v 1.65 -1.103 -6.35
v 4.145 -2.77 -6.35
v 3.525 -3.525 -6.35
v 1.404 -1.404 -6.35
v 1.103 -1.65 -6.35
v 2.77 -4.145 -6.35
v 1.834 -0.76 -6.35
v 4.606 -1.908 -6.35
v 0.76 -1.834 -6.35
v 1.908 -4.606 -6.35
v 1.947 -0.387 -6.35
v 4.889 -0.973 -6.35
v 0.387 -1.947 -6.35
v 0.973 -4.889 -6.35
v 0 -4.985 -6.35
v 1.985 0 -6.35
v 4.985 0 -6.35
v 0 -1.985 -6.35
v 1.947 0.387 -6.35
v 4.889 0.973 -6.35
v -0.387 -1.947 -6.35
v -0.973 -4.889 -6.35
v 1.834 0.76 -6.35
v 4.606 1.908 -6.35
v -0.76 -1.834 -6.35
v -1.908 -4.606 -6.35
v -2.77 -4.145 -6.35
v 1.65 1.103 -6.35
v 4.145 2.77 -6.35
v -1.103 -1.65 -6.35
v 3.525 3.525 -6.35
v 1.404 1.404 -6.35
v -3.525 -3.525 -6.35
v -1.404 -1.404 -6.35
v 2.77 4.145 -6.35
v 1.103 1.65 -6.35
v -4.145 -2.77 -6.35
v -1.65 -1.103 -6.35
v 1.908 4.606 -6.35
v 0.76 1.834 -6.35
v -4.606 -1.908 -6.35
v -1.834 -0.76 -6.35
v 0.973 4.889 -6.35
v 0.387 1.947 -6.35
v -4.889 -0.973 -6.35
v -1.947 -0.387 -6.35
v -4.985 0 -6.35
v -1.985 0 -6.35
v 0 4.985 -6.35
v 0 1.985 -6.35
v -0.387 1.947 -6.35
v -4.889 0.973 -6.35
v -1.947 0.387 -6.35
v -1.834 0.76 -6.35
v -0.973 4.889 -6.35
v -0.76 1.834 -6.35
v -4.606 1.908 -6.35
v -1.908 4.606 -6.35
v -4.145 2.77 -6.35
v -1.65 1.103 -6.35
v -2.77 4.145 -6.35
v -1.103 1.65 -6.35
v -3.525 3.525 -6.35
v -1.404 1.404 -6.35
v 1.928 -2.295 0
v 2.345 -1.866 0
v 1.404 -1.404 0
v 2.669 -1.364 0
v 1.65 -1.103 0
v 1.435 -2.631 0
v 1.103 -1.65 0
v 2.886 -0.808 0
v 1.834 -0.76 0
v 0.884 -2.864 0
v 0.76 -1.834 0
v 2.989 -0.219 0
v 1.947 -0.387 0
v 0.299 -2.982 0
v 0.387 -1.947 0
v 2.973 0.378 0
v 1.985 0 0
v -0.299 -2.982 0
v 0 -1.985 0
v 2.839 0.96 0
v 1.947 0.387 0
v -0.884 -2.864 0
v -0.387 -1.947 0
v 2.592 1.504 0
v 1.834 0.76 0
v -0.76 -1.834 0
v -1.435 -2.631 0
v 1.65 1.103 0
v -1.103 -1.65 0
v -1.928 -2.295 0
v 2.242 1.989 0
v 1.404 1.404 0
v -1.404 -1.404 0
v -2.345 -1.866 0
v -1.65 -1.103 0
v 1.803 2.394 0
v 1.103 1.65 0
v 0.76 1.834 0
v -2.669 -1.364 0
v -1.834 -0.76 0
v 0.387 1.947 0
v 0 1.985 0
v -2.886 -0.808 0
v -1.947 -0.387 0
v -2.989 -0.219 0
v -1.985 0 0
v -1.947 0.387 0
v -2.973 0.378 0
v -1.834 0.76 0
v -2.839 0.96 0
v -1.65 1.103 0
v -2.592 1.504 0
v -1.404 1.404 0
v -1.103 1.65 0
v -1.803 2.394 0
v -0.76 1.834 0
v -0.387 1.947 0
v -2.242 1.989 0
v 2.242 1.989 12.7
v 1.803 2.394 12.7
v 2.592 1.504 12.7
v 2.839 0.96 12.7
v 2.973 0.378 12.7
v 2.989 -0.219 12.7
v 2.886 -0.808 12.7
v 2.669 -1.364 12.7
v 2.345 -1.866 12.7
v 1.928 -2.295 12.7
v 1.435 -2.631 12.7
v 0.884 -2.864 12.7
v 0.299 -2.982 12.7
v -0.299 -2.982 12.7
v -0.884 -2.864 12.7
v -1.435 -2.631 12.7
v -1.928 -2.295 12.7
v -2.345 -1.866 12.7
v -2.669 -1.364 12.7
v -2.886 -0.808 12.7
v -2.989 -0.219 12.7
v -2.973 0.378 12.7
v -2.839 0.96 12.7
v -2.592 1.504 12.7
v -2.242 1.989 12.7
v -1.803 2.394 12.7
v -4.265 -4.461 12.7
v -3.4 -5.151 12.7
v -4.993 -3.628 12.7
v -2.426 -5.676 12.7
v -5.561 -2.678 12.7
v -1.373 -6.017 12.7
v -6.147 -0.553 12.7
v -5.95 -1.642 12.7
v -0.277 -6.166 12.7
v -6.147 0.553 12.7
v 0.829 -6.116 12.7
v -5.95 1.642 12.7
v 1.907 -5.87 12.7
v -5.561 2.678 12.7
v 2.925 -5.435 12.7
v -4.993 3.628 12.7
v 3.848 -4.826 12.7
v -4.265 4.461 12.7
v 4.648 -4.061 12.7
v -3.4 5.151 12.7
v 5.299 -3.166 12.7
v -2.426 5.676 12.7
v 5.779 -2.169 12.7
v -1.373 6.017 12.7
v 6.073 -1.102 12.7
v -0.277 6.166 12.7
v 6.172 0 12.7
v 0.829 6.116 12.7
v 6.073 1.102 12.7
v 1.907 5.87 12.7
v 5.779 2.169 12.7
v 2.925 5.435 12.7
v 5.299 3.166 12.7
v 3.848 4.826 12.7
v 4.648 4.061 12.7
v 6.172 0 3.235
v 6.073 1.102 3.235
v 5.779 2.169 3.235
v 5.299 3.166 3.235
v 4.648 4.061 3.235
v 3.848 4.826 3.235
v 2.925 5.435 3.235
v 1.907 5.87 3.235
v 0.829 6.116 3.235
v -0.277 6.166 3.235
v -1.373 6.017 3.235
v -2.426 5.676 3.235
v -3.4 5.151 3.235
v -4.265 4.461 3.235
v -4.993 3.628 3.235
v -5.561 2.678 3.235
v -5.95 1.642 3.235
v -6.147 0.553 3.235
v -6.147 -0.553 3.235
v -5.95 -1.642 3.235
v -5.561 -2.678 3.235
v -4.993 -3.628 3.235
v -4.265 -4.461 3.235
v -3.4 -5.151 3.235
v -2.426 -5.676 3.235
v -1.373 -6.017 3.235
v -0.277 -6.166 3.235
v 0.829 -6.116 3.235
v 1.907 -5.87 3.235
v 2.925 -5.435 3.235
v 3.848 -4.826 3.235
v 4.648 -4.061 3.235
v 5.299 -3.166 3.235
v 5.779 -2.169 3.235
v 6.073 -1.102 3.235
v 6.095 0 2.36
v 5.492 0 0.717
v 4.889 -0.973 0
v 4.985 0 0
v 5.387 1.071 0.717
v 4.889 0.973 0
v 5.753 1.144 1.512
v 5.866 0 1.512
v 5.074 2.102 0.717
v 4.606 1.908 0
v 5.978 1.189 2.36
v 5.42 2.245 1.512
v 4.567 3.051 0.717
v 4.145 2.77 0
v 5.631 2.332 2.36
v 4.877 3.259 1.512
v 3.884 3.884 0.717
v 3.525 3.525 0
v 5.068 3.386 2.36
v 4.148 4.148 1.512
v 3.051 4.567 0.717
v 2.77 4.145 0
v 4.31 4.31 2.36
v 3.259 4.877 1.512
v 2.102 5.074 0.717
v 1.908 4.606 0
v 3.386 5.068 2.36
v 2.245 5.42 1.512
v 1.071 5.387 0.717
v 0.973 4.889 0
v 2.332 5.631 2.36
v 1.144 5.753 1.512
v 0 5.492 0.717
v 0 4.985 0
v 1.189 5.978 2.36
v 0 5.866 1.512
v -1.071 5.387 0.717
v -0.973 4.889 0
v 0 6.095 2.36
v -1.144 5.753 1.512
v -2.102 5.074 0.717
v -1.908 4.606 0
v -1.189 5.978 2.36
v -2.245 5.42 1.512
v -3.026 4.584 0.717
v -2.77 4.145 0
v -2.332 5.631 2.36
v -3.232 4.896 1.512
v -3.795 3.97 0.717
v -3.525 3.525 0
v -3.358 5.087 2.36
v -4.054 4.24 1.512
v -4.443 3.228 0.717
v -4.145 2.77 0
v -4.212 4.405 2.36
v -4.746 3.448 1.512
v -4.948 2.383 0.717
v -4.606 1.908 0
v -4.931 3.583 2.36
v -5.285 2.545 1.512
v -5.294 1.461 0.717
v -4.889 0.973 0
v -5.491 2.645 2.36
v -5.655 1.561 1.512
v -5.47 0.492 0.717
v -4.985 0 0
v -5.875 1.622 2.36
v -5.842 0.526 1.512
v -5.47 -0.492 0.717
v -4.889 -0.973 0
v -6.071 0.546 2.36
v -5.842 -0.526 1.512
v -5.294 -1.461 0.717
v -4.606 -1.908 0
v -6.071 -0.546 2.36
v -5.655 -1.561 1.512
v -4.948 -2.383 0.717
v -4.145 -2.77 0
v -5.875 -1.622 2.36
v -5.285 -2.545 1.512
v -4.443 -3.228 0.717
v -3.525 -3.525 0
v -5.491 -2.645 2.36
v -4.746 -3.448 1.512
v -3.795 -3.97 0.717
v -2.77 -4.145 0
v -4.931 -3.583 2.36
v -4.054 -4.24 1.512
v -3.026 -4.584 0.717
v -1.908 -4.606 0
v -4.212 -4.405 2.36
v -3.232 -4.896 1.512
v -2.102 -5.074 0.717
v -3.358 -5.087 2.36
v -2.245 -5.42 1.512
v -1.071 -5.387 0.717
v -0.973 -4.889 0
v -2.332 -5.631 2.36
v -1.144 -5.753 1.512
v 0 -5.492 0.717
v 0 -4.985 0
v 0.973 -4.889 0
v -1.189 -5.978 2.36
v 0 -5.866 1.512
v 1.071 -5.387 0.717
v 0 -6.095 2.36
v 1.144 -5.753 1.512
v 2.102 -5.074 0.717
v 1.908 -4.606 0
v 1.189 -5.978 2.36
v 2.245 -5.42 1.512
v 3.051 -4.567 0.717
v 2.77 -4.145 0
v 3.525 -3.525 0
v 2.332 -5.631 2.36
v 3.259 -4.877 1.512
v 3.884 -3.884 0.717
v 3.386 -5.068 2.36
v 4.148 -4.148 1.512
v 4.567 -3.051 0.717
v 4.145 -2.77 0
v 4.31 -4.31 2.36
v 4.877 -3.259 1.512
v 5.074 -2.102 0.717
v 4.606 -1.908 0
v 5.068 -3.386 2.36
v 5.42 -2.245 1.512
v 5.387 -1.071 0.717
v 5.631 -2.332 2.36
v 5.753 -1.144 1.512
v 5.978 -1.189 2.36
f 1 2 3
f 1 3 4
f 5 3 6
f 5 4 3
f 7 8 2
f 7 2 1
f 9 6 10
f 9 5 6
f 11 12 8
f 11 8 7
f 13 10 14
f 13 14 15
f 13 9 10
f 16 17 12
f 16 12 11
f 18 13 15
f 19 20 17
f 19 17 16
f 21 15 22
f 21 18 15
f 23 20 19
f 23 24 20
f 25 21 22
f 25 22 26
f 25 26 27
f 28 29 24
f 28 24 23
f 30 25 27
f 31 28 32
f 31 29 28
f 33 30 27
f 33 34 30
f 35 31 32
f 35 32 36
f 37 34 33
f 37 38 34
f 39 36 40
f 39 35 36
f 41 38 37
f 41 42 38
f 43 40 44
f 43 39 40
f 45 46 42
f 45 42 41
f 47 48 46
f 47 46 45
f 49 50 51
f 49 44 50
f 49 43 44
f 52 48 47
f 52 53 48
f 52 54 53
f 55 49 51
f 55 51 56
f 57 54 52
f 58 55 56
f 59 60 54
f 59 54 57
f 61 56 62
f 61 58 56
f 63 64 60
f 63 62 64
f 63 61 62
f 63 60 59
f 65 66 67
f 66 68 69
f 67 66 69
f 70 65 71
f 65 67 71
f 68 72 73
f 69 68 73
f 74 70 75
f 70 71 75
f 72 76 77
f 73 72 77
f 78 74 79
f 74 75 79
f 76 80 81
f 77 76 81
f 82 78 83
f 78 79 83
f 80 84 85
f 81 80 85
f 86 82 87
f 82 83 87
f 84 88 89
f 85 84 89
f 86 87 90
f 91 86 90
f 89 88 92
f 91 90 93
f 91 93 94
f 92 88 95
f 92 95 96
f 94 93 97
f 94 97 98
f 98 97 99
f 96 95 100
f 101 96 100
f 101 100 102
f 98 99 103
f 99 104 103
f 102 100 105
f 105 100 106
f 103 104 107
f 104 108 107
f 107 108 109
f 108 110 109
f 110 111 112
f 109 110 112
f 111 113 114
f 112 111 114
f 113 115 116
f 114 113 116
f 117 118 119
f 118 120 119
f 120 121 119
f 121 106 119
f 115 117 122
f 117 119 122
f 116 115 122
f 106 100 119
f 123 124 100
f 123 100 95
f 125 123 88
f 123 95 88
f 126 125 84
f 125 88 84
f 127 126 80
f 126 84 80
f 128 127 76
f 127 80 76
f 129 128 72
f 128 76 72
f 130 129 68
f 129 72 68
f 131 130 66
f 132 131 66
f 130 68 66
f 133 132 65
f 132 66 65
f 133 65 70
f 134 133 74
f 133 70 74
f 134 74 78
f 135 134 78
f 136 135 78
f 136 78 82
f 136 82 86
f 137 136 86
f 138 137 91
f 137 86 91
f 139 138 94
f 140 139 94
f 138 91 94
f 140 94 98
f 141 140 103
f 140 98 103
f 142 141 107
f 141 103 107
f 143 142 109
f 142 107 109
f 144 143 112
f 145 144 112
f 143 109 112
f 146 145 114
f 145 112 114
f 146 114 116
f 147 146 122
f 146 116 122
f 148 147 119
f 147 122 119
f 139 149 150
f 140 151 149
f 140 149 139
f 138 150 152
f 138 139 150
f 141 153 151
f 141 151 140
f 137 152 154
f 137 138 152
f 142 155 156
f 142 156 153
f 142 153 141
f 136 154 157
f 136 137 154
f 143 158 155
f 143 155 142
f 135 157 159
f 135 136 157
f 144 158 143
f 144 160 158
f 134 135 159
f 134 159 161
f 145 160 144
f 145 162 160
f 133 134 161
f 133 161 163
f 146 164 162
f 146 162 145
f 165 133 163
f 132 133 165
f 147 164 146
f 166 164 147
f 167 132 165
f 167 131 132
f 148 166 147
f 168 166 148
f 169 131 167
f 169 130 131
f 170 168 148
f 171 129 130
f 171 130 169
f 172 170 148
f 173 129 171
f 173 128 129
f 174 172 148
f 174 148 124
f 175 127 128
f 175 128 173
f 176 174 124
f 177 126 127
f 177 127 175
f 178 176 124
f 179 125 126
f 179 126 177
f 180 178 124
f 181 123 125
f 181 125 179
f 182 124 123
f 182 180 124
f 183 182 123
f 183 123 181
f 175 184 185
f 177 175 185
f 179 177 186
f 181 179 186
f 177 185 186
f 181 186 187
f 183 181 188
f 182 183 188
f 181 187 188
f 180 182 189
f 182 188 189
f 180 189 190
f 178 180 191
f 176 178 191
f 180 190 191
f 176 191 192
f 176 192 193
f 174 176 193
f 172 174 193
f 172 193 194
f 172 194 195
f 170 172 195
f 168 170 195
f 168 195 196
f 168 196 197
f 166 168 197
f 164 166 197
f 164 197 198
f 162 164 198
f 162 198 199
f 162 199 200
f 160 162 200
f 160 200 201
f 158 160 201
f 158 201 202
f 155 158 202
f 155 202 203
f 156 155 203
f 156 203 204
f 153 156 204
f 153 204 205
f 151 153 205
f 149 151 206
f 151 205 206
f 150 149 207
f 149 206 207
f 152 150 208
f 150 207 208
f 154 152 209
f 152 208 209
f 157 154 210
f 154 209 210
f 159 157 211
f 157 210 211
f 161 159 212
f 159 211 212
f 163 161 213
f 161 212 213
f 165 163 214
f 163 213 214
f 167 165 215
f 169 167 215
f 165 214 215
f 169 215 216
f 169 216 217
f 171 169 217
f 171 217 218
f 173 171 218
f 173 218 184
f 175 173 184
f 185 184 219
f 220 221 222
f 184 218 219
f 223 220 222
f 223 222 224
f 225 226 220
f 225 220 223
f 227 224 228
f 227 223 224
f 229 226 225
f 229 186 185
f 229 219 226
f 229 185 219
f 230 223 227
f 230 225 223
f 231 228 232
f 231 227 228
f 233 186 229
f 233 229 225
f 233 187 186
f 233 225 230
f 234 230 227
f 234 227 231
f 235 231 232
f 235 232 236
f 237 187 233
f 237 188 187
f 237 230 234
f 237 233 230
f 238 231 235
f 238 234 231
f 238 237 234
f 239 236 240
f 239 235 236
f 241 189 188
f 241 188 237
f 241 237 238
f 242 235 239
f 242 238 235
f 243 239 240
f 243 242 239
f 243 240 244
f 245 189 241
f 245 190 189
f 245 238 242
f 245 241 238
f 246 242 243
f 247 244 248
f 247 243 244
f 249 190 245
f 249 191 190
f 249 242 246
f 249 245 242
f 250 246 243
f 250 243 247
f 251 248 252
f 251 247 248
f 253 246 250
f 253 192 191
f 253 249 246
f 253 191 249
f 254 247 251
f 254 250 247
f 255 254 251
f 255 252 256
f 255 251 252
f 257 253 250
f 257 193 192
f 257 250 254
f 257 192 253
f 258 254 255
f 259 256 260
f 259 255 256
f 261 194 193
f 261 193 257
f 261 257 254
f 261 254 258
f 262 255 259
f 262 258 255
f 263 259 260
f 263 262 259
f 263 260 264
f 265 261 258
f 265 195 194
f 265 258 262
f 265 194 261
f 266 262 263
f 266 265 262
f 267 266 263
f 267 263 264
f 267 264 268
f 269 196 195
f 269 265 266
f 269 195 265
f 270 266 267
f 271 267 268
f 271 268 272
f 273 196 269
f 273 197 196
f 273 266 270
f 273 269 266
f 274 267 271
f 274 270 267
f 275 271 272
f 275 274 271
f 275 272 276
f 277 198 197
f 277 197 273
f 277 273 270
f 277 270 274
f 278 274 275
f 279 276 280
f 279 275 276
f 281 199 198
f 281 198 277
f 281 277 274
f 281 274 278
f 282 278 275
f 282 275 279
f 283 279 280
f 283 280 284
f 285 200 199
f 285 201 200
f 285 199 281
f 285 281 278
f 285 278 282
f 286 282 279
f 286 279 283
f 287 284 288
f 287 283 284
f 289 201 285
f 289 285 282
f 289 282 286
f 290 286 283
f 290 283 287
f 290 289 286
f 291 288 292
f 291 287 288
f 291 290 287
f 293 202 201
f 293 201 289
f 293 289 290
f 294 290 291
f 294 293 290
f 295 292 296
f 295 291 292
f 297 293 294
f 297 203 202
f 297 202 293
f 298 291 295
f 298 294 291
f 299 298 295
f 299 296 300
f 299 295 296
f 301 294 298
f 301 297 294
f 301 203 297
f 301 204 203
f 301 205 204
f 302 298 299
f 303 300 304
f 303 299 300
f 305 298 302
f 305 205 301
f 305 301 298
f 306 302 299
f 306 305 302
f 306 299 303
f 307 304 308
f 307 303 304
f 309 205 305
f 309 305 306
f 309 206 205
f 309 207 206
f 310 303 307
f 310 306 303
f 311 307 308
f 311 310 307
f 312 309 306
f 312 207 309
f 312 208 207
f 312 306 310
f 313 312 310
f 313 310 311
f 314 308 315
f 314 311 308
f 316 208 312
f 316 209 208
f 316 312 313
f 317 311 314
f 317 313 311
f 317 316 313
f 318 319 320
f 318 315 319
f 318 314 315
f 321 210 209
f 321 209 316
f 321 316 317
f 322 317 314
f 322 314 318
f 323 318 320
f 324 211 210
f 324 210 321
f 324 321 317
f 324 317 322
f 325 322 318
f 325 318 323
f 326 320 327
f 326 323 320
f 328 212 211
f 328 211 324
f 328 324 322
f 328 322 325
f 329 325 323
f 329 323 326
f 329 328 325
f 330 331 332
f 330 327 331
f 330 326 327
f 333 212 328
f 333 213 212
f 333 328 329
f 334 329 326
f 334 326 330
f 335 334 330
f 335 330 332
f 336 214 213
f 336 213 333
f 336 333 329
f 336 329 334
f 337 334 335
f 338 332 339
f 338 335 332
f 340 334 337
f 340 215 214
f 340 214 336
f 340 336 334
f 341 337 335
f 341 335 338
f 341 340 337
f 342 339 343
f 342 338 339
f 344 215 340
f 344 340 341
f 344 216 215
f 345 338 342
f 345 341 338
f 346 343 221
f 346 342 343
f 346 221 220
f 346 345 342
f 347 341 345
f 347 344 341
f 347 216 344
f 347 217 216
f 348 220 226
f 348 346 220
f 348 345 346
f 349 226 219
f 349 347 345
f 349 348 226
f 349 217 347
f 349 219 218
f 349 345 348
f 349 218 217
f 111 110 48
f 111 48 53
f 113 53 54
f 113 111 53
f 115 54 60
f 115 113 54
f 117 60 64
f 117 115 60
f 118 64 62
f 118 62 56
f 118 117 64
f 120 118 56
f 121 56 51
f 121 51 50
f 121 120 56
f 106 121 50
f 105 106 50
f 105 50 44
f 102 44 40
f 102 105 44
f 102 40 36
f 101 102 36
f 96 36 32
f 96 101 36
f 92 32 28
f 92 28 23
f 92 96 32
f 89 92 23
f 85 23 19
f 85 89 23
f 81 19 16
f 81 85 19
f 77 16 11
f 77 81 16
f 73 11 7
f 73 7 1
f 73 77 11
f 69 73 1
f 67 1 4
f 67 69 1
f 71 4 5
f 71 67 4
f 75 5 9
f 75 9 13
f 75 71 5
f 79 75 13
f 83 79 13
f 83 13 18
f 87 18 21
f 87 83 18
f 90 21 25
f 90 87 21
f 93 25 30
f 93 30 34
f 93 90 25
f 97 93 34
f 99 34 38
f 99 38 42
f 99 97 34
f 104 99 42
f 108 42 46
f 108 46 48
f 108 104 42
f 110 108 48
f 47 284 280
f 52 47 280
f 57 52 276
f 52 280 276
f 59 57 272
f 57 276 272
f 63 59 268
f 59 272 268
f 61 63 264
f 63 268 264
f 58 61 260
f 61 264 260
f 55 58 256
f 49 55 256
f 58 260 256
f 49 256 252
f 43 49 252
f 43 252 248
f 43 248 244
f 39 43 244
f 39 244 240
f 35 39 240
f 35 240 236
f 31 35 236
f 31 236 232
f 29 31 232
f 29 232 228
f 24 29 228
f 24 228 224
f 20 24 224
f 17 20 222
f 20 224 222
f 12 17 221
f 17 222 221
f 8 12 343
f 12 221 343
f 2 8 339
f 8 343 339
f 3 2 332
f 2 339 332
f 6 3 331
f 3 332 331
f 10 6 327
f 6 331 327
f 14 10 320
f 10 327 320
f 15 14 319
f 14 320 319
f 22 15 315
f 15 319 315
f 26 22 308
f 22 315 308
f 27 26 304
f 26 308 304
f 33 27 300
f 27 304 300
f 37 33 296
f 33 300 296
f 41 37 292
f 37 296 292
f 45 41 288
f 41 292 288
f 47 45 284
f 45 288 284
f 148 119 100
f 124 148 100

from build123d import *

# Parameters (mm, degrees)
SKETCH1_R           = 6.1722
BOSS_EXTRUDE1_DEPTH = 12.7
SKETCH2_R           = 4.985
SKETCH2_R_2         = 1.985
BOSS_EXTRUDE2_DEPTH = 6.35
FILLET1_R           = 5


with BuildPart() as part:
    # Sketch1 → Boss-Extrude1 (new body)
    with BuildSketch(Plane.XY):
        Circle(SKETCH1_R)
        with BuildLine():
            Line((-1.8034, 2.393941578), (1.8034, 2.393941578))
            ThreePointArc((1.8034, 2.393941578), (0, -2.9972), (-1.8034, 2.393941578))
        make_face(mode=Mode.SUBTRACT)
    extrude(amount=BOSS_EXTRUDE1_DEPTH)

    # Sketch2 → Boss-Extrude2 (add)
    with BuildSketch(Plane(origin=(0, 0, 0), x_dir=(-1, 0, 0), z_dir=(0, 0, -1))):
        Circle(SKETCH2_R)
        Circle(SKETCH2_R_2, mode=Mode.SUBTRACT)
    extrude(amount=BOSS_EXTRUDE2_DEPTH)

    # Fillet1
    # the kernel refuses this fillet: 5 mm, written as the material it takes off along each edge
    with BuildSketch(Plane(origin=(0, 0, 0), x_dir=(1, 0, 0), z_dir=(0, -1, 0))) as fillet1_piece_1_section:
        with BuildLine():
            CenterArc((1.1722, 3.234587479), FILLET1_R, 319.690404577, 40.309595423)
            Line((4.985, 0), (5.061256, -0.06469175))
            ThreePointArc((5.061256, -0.06469175), (5.5786, -0.1), (6.1722, -0.1))
            Line((6.1722, -0.1), (6.2722, 0))
            Line((6.2722, 0), (6.2722, 3.234587479))
            Line((6.2722, 3.234587479), (6.1722, 3.234587479))
        make_face()
    fillet1_piece_1 = revolve(axis=Axis((0, 0, 0), (0, 0, 1)), mode=Mode.PRIVATE)
    fillet1_piece_1 = fillet1_piece_1 - Plane(origin=(0, 0, 1.498233037), x_dir=(-1, 0, 0), z_dir=(0, 0, 1)) * Cylinder(4.985, 26, mode=Mode.PRIVATE)
    add(fillet1_piece_1, mode=Mode.SUBTRACT)


solid = part.part
